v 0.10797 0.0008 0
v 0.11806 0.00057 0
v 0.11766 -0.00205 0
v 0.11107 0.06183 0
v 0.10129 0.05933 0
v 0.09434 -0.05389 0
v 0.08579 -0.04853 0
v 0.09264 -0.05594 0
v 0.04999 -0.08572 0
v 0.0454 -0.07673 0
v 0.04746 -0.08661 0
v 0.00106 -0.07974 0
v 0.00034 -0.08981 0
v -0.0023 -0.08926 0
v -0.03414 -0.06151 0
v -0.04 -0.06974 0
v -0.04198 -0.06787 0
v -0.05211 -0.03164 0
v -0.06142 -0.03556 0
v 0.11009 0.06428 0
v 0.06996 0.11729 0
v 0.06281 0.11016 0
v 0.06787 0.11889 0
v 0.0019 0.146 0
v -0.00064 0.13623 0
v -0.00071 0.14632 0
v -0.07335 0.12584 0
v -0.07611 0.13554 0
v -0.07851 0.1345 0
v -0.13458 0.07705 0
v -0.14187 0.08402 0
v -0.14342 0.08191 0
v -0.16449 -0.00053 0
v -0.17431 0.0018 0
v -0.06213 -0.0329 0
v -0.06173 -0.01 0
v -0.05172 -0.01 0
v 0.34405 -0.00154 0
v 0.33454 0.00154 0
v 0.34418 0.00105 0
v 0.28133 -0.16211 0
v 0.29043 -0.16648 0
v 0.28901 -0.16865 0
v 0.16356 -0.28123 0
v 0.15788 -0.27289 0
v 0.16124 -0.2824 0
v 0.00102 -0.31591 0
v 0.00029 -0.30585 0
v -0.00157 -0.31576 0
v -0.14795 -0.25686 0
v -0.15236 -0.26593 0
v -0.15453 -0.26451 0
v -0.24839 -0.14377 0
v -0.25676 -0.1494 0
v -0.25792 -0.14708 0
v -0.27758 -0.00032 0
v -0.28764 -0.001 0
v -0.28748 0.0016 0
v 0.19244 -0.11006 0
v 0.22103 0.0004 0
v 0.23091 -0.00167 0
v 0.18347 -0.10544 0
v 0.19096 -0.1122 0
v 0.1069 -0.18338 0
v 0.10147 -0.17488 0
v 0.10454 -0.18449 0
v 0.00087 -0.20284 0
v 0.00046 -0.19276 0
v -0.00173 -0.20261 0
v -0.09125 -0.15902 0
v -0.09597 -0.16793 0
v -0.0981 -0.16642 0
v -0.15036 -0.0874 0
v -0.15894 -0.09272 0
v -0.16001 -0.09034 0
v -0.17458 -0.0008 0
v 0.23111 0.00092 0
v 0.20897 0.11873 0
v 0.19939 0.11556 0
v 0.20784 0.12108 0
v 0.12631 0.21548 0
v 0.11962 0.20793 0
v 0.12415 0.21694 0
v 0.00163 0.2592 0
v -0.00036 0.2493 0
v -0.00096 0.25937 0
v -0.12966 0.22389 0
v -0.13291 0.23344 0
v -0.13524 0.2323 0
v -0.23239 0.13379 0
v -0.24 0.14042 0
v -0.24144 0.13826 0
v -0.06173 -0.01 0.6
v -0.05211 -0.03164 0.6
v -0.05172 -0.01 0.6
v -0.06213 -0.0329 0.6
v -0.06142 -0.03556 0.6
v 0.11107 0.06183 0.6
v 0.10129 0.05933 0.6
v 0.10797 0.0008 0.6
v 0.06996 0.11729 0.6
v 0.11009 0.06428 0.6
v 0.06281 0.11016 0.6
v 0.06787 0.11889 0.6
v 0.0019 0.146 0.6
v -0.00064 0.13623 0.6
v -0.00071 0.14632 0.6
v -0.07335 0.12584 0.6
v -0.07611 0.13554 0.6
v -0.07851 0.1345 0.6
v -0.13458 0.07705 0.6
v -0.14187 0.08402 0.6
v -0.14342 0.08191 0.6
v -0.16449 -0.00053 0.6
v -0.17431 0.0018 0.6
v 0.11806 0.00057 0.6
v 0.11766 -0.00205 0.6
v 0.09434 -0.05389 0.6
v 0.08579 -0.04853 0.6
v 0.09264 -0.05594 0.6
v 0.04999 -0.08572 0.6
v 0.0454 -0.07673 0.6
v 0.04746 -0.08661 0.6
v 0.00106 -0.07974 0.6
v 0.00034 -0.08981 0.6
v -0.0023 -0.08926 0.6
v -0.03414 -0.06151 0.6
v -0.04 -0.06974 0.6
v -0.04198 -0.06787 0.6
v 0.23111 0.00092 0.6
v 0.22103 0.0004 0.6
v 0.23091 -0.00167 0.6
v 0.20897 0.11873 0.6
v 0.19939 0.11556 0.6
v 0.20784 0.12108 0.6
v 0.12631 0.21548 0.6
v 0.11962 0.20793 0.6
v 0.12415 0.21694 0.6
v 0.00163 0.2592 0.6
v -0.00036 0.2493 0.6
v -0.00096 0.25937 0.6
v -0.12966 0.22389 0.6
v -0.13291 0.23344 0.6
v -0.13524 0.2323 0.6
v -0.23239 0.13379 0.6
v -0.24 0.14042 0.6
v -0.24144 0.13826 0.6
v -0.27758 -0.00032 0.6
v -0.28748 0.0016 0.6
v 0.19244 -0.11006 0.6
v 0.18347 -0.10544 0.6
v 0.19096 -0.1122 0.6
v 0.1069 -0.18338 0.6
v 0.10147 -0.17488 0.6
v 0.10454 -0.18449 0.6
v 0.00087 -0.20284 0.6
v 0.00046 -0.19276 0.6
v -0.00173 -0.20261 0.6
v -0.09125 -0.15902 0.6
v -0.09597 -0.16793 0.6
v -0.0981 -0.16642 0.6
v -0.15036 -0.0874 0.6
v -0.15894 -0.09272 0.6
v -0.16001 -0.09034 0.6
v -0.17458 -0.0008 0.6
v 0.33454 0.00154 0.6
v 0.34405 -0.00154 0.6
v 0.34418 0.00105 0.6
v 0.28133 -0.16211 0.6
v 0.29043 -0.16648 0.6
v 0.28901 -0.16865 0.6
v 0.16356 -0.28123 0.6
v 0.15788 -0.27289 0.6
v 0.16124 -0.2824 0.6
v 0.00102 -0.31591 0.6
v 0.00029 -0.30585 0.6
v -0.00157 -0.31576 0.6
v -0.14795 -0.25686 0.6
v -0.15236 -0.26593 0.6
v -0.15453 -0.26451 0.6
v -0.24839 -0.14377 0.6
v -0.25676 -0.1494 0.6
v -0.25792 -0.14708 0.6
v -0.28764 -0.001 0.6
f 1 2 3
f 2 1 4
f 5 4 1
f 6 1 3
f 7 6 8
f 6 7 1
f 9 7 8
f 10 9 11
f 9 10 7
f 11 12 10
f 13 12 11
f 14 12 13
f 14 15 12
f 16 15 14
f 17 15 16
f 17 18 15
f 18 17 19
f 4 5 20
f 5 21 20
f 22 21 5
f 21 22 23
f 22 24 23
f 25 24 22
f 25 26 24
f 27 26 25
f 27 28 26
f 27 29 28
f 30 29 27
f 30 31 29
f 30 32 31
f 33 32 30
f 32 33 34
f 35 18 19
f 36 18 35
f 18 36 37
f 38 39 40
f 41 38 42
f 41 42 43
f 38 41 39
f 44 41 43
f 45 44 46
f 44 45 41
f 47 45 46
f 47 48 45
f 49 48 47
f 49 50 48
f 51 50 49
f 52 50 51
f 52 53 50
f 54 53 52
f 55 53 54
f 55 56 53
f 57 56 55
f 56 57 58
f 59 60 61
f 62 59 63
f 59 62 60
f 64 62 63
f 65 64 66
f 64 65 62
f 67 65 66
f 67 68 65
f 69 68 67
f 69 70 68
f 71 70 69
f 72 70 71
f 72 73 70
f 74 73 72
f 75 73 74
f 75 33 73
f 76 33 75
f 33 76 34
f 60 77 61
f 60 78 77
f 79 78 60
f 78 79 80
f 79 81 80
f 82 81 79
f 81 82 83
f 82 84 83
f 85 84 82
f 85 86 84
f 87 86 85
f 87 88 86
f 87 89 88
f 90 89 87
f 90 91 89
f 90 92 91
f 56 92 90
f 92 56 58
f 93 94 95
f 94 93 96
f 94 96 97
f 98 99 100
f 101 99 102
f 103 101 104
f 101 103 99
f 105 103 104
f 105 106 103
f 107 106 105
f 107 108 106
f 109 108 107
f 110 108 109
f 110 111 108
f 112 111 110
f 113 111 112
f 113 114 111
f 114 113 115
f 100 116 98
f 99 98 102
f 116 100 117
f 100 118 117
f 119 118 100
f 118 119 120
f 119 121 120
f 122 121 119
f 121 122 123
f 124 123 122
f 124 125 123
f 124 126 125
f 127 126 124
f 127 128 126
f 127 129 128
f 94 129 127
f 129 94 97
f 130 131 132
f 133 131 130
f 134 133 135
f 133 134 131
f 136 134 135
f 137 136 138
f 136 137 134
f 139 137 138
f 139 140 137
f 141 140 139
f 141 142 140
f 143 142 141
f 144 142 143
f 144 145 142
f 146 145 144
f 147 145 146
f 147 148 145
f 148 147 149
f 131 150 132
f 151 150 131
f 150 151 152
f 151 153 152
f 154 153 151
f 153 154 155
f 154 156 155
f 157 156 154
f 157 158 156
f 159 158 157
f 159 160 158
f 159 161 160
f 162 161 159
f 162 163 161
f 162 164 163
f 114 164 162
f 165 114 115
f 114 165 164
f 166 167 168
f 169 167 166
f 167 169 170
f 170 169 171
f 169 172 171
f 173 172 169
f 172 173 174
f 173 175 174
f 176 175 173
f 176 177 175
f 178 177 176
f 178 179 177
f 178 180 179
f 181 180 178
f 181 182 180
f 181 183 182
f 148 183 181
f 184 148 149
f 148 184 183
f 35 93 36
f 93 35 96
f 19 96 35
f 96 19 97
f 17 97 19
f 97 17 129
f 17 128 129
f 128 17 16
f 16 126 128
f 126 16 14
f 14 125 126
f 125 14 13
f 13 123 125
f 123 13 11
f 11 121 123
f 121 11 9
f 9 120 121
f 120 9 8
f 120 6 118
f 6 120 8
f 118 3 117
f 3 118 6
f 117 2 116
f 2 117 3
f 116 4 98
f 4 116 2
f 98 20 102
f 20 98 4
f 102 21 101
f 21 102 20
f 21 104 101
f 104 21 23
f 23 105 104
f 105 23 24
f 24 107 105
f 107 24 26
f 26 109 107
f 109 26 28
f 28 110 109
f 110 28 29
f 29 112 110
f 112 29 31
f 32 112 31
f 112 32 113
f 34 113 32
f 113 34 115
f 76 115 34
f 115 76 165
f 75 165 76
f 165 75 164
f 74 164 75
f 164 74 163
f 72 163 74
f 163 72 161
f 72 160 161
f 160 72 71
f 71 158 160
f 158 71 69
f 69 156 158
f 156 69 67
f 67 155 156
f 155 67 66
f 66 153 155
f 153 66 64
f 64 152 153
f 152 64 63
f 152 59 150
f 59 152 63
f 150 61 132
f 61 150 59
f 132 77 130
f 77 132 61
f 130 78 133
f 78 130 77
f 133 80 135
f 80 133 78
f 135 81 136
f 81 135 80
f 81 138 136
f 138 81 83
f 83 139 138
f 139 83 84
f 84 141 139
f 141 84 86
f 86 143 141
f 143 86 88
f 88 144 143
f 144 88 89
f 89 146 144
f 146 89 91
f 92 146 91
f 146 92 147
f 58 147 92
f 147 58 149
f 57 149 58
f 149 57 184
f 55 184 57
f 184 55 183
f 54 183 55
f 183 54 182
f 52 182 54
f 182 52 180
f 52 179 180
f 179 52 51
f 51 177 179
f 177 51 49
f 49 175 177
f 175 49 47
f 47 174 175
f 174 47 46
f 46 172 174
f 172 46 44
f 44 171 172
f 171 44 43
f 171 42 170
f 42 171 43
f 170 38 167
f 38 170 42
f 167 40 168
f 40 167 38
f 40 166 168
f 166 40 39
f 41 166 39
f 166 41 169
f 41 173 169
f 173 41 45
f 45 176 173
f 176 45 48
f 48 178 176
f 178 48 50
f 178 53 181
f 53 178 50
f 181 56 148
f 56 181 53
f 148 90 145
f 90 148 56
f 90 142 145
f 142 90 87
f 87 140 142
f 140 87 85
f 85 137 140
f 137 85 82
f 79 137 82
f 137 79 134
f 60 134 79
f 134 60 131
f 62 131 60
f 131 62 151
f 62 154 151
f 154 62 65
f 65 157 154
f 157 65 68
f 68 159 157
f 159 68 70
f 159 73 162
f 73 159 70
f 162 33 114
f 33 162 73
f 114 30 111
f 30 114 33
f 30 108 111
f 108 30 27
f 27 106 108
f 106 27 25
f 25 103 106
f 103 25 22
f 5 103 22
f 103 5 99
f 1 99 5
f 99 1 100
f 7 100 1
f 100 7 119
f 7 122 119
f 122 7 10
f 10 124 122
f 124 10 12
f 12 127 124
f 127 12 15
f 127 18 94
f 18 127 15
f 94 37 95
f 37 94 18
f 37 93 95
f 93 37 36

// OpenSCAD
use <lib.scad>

/*************
* Examples *
*************/
// To render an example, remove the comments
pi = 3.1415926536;
e = 2.718281828;
// function to convert degrees to radians
function d2r(theta) = theta*360/(2*pi);

/* Cartesian equations */
/* Sine wave */
//pi = 3.14159;
//function f(x) = 20*sin((1/4)*d2r(x));
//linear_extrude(height=5) 2dgraph([-50, 50], 3, steps=50);

/* Parabola */
//function f(x) = pow(x, 2)/20;
//linear_extrude(height=5)
//	2dgraph([-50, 50], 3, steps=40);

/* Ellipsoid */
//function f(x) = sqrt((2500-pow(x, 2))/3);
//rotate_extrude(convexity=10, $fn=100)
//	rotate([0, 0, -90]) 2dgraph([-50, 50], 3, steps=100);

/* Blancmange curve (an approximation)
works best to export to dxf first, then extrude that.
the 2d render takes a long time at this resolution */
//function blancmange(x, n) = abs(round(pow(2, n)*x)-pow(2, n)*x)/pow(2, n);
//function f(x) = blancmange(x, 0) + blancmange(x, 1) + blancmange(x, 2) + blancmange(x, 3) + blancmange(x, 4) + blancmange(x, 5) + blancmange(x, 6);
////scale([100, 100, 100]) linear_extrude(height=0.125) import_dxf("blancmange.dxf");
//2dgraph([0, 1], 0.02, steps=480);

/* Polar equations */
/* Rose curve */
//function r(theta) = cos(4*theta);
//scale([20, 20, 20]) linear_extrude(height=0.15)
//	2dgraph([0, 720], 0.1, steps=160, polar=true);

/* Archimedes spiral */
function r(theta) = theta/2*pi;
//scale([0.02, 0.02, 0.02]) linear_extrude(height=150)
//	2dgraph([0, 360*3], 50, steps=100, polar=true);

/* Golden spiral */
//function r(theta) = pow(e, 0.0053468*theta);
//linear_extrude(height=50)
//	2dgraph([0, 7*180], 1, steps=300, polar=true);

/* Parametric equations */
/* 9-pointed star */
//function x(t) = cos(t);
//function y(t) = sin(t);
//scale([10, 10, 10]) linear_extrude(height=0.25)
//	2dgraph([10, 1450], 0.1, steps=9, parametric=true);

/* Squiggly */
//function x(t) = sin(d2r(t))*cos(d2r(t)) + sin(2*d2r(t))*cos(2*d2r(t)) + sin(3*d2r(t))*cos(3*d2r(t)) + sin(4*d2r(t))*cos(4*d2r(t));
//function y(t) = sin(d2r(t))*cos(2*d2r(t)) + sin(3*d2r(t))*cos(4*d2r(t)) + sin(5*d2r(t))*cos(6*d2r(t)) + sin(7*d2r(t))*cos(8*d2r(t));
//scale([20, 10, 20]) linear_extrude(height=0.15)
//	2dgraph([0, 3*pi], 0.06, steps=400, parametric=true);

/* Butterfly curve! */
//function x(t) = sin(d2r(t))*(pow(e, cos(d2r(t)))-2*cos(4*d2r(t))-pow(sin(d2r(t)/12), 5));
//function y(t) = cos(d2r(t))*(pow(e, cos(d2r(t)))-2*cos(4*d2r(t))-pow(sin(d2r(t)/12), 5));
////scale([20, 20, 20]) linear_extrude(height=0.25) import_dxf("butterflycurve.dxf");
//2dgraph([0, 20*pi], 0.06, steps=1000, parametric=true);

/*********************
* End of examples *
*********************/

// These functions are here to help get the slope of each segment, and use that to find points for a correctly oriented polygon
function diffx(x1, y1, x2, y2, th) = cos(atan((y2-y1)/(x2-x1)) + 90)*(th/2);
function diffy(x1, y1, x2, y2, th) = sin(atan((y2-y1)/(x2-x1)) + 90)*(th/2);
function point1(x1, y1, x2, y2, th) = [x1-diffx(x1, y1, x2, y2, th), y1-diffy(x1, y1, x2, y2, th)];
function point2(x1, y1, x2, y2, th) = [x2-diffx(x1, y1, x2, y2, th), y2-diffy(x1, y1, x2, y2, th)];
function point3(x1, y1, x2, y2, th) = [x2+diffx(x1, y1, x2, y2, th), y2+diffy(x1, y1, x2, y2, th)];
function point4(x1, y1, x2, y2, th) = [x1+diffx(x1, y1, x2, y2, th), y1+diffy(x1, y1, x2, y2, th)];
function polarX(theta) = cos(theta)*r(theta);
function polarY(theta) = sin(theta)*r(theta);

module nextPolygon(x1, y1, x2, y2, x3, y3, th) {
	if((x2 > x1 && x2-diffx(x2, y2, x3, y3, th) < x2-diffx(x1, y1, x2, y2, th) || (x2 <= x1 && x2-diffx(x2, y2, x3, y3, th) > x2-diffx(x1, y1, x2, y2, th)))) {
		polygon(
			points = [
				point1(x1, y1, x2, y2, th),
				point2(x1, y1, x2, y2, th),
				// This point connects this segment to the next
				point4(x2, y2, x3, y3, th),
				point3(x1, y1, x2, y2, th),
				point4(x1, y1, x2, y2, th)
			],
			paths = [[0,1,2,3,4]]
		);
	}
	else if((x2 > x1 && x2-diffx(x2, y2, x3, y3, th) > x2-diffx(x1, y1, x2, y2, th) || (x2 <= x1 && x2-diffx(x2, y2, x3, y3, th) < x2-diffx(x1, y1, x2, y2, th)))) {
		polygon(
			points = [
				point1(x1, y1, x2, y2, th),
				point2(x1, y1, x2, y2, th),
				// This point connects this segment to the next
				point1(x2, y2, x3, y3, th),
				point3(x1, y1, x2, y2, th),
				point4(x1, y1, x2, y2, th)
			],
			paths = [[0,1,2,3,4]]
		);
	}
	else {
		polygon(
			points = [
				point1(x1, y1, x2, y2, th),
				point2(x1, y1, x2, y2, th),
				point3(x1, y1, x2, y2, th),
				point4(x1, y1, x2, y2, th)
			],
			paths = [[0,1,2,3]]
		);
	}
}

module 2dgraph(bounds=[-10,10], th=2, steps=10, polar=false, parametric=false) {
	step = (bounds[1]-bounds[0])/steps;
	union() {
		for(i = [bounds[0]:step:bounds[1]-step]) {
			if(polar) {
				nextPolygon(polarX(i), polarY(i), polarX(i+step), polarY(i+step), polarX(i+2*step), polarY(i+2*step), th);
			}
			else if(parametric) {
				nextPolygon(x(i), y(i), x(i+step), y(i+step), x(i+2*step), y(i+2*step), th);
			}
			else {
				nextPolygon(i, f(i), i+step, f(i+step), i+2*step, f(i+2*step), th);
			}
		}
	}
}

module spiral() {
	scale([0.02, 0.02, 0.02]) linear_extrude(height=3000)
		2dgraph([0, 360*3], 50, steps=$fn, polar=true);
}


module sheet() {
	difference() {
		scale([0.01, 0.01, 0.01]) spiral();
		#translate([-0.025,0.04,0.25]) box([0.1,0.1,1.0]);
	}
}

sheet($fn=36);
//#translate([0.02,-0.02,0.3]) scale([1.075,1,1]) difference() {
//	cyl(0.3, 0.3, 0.6, $fn=8);
//	cyl(0.28, 0.28, 0.61, $fn=8);
//}
